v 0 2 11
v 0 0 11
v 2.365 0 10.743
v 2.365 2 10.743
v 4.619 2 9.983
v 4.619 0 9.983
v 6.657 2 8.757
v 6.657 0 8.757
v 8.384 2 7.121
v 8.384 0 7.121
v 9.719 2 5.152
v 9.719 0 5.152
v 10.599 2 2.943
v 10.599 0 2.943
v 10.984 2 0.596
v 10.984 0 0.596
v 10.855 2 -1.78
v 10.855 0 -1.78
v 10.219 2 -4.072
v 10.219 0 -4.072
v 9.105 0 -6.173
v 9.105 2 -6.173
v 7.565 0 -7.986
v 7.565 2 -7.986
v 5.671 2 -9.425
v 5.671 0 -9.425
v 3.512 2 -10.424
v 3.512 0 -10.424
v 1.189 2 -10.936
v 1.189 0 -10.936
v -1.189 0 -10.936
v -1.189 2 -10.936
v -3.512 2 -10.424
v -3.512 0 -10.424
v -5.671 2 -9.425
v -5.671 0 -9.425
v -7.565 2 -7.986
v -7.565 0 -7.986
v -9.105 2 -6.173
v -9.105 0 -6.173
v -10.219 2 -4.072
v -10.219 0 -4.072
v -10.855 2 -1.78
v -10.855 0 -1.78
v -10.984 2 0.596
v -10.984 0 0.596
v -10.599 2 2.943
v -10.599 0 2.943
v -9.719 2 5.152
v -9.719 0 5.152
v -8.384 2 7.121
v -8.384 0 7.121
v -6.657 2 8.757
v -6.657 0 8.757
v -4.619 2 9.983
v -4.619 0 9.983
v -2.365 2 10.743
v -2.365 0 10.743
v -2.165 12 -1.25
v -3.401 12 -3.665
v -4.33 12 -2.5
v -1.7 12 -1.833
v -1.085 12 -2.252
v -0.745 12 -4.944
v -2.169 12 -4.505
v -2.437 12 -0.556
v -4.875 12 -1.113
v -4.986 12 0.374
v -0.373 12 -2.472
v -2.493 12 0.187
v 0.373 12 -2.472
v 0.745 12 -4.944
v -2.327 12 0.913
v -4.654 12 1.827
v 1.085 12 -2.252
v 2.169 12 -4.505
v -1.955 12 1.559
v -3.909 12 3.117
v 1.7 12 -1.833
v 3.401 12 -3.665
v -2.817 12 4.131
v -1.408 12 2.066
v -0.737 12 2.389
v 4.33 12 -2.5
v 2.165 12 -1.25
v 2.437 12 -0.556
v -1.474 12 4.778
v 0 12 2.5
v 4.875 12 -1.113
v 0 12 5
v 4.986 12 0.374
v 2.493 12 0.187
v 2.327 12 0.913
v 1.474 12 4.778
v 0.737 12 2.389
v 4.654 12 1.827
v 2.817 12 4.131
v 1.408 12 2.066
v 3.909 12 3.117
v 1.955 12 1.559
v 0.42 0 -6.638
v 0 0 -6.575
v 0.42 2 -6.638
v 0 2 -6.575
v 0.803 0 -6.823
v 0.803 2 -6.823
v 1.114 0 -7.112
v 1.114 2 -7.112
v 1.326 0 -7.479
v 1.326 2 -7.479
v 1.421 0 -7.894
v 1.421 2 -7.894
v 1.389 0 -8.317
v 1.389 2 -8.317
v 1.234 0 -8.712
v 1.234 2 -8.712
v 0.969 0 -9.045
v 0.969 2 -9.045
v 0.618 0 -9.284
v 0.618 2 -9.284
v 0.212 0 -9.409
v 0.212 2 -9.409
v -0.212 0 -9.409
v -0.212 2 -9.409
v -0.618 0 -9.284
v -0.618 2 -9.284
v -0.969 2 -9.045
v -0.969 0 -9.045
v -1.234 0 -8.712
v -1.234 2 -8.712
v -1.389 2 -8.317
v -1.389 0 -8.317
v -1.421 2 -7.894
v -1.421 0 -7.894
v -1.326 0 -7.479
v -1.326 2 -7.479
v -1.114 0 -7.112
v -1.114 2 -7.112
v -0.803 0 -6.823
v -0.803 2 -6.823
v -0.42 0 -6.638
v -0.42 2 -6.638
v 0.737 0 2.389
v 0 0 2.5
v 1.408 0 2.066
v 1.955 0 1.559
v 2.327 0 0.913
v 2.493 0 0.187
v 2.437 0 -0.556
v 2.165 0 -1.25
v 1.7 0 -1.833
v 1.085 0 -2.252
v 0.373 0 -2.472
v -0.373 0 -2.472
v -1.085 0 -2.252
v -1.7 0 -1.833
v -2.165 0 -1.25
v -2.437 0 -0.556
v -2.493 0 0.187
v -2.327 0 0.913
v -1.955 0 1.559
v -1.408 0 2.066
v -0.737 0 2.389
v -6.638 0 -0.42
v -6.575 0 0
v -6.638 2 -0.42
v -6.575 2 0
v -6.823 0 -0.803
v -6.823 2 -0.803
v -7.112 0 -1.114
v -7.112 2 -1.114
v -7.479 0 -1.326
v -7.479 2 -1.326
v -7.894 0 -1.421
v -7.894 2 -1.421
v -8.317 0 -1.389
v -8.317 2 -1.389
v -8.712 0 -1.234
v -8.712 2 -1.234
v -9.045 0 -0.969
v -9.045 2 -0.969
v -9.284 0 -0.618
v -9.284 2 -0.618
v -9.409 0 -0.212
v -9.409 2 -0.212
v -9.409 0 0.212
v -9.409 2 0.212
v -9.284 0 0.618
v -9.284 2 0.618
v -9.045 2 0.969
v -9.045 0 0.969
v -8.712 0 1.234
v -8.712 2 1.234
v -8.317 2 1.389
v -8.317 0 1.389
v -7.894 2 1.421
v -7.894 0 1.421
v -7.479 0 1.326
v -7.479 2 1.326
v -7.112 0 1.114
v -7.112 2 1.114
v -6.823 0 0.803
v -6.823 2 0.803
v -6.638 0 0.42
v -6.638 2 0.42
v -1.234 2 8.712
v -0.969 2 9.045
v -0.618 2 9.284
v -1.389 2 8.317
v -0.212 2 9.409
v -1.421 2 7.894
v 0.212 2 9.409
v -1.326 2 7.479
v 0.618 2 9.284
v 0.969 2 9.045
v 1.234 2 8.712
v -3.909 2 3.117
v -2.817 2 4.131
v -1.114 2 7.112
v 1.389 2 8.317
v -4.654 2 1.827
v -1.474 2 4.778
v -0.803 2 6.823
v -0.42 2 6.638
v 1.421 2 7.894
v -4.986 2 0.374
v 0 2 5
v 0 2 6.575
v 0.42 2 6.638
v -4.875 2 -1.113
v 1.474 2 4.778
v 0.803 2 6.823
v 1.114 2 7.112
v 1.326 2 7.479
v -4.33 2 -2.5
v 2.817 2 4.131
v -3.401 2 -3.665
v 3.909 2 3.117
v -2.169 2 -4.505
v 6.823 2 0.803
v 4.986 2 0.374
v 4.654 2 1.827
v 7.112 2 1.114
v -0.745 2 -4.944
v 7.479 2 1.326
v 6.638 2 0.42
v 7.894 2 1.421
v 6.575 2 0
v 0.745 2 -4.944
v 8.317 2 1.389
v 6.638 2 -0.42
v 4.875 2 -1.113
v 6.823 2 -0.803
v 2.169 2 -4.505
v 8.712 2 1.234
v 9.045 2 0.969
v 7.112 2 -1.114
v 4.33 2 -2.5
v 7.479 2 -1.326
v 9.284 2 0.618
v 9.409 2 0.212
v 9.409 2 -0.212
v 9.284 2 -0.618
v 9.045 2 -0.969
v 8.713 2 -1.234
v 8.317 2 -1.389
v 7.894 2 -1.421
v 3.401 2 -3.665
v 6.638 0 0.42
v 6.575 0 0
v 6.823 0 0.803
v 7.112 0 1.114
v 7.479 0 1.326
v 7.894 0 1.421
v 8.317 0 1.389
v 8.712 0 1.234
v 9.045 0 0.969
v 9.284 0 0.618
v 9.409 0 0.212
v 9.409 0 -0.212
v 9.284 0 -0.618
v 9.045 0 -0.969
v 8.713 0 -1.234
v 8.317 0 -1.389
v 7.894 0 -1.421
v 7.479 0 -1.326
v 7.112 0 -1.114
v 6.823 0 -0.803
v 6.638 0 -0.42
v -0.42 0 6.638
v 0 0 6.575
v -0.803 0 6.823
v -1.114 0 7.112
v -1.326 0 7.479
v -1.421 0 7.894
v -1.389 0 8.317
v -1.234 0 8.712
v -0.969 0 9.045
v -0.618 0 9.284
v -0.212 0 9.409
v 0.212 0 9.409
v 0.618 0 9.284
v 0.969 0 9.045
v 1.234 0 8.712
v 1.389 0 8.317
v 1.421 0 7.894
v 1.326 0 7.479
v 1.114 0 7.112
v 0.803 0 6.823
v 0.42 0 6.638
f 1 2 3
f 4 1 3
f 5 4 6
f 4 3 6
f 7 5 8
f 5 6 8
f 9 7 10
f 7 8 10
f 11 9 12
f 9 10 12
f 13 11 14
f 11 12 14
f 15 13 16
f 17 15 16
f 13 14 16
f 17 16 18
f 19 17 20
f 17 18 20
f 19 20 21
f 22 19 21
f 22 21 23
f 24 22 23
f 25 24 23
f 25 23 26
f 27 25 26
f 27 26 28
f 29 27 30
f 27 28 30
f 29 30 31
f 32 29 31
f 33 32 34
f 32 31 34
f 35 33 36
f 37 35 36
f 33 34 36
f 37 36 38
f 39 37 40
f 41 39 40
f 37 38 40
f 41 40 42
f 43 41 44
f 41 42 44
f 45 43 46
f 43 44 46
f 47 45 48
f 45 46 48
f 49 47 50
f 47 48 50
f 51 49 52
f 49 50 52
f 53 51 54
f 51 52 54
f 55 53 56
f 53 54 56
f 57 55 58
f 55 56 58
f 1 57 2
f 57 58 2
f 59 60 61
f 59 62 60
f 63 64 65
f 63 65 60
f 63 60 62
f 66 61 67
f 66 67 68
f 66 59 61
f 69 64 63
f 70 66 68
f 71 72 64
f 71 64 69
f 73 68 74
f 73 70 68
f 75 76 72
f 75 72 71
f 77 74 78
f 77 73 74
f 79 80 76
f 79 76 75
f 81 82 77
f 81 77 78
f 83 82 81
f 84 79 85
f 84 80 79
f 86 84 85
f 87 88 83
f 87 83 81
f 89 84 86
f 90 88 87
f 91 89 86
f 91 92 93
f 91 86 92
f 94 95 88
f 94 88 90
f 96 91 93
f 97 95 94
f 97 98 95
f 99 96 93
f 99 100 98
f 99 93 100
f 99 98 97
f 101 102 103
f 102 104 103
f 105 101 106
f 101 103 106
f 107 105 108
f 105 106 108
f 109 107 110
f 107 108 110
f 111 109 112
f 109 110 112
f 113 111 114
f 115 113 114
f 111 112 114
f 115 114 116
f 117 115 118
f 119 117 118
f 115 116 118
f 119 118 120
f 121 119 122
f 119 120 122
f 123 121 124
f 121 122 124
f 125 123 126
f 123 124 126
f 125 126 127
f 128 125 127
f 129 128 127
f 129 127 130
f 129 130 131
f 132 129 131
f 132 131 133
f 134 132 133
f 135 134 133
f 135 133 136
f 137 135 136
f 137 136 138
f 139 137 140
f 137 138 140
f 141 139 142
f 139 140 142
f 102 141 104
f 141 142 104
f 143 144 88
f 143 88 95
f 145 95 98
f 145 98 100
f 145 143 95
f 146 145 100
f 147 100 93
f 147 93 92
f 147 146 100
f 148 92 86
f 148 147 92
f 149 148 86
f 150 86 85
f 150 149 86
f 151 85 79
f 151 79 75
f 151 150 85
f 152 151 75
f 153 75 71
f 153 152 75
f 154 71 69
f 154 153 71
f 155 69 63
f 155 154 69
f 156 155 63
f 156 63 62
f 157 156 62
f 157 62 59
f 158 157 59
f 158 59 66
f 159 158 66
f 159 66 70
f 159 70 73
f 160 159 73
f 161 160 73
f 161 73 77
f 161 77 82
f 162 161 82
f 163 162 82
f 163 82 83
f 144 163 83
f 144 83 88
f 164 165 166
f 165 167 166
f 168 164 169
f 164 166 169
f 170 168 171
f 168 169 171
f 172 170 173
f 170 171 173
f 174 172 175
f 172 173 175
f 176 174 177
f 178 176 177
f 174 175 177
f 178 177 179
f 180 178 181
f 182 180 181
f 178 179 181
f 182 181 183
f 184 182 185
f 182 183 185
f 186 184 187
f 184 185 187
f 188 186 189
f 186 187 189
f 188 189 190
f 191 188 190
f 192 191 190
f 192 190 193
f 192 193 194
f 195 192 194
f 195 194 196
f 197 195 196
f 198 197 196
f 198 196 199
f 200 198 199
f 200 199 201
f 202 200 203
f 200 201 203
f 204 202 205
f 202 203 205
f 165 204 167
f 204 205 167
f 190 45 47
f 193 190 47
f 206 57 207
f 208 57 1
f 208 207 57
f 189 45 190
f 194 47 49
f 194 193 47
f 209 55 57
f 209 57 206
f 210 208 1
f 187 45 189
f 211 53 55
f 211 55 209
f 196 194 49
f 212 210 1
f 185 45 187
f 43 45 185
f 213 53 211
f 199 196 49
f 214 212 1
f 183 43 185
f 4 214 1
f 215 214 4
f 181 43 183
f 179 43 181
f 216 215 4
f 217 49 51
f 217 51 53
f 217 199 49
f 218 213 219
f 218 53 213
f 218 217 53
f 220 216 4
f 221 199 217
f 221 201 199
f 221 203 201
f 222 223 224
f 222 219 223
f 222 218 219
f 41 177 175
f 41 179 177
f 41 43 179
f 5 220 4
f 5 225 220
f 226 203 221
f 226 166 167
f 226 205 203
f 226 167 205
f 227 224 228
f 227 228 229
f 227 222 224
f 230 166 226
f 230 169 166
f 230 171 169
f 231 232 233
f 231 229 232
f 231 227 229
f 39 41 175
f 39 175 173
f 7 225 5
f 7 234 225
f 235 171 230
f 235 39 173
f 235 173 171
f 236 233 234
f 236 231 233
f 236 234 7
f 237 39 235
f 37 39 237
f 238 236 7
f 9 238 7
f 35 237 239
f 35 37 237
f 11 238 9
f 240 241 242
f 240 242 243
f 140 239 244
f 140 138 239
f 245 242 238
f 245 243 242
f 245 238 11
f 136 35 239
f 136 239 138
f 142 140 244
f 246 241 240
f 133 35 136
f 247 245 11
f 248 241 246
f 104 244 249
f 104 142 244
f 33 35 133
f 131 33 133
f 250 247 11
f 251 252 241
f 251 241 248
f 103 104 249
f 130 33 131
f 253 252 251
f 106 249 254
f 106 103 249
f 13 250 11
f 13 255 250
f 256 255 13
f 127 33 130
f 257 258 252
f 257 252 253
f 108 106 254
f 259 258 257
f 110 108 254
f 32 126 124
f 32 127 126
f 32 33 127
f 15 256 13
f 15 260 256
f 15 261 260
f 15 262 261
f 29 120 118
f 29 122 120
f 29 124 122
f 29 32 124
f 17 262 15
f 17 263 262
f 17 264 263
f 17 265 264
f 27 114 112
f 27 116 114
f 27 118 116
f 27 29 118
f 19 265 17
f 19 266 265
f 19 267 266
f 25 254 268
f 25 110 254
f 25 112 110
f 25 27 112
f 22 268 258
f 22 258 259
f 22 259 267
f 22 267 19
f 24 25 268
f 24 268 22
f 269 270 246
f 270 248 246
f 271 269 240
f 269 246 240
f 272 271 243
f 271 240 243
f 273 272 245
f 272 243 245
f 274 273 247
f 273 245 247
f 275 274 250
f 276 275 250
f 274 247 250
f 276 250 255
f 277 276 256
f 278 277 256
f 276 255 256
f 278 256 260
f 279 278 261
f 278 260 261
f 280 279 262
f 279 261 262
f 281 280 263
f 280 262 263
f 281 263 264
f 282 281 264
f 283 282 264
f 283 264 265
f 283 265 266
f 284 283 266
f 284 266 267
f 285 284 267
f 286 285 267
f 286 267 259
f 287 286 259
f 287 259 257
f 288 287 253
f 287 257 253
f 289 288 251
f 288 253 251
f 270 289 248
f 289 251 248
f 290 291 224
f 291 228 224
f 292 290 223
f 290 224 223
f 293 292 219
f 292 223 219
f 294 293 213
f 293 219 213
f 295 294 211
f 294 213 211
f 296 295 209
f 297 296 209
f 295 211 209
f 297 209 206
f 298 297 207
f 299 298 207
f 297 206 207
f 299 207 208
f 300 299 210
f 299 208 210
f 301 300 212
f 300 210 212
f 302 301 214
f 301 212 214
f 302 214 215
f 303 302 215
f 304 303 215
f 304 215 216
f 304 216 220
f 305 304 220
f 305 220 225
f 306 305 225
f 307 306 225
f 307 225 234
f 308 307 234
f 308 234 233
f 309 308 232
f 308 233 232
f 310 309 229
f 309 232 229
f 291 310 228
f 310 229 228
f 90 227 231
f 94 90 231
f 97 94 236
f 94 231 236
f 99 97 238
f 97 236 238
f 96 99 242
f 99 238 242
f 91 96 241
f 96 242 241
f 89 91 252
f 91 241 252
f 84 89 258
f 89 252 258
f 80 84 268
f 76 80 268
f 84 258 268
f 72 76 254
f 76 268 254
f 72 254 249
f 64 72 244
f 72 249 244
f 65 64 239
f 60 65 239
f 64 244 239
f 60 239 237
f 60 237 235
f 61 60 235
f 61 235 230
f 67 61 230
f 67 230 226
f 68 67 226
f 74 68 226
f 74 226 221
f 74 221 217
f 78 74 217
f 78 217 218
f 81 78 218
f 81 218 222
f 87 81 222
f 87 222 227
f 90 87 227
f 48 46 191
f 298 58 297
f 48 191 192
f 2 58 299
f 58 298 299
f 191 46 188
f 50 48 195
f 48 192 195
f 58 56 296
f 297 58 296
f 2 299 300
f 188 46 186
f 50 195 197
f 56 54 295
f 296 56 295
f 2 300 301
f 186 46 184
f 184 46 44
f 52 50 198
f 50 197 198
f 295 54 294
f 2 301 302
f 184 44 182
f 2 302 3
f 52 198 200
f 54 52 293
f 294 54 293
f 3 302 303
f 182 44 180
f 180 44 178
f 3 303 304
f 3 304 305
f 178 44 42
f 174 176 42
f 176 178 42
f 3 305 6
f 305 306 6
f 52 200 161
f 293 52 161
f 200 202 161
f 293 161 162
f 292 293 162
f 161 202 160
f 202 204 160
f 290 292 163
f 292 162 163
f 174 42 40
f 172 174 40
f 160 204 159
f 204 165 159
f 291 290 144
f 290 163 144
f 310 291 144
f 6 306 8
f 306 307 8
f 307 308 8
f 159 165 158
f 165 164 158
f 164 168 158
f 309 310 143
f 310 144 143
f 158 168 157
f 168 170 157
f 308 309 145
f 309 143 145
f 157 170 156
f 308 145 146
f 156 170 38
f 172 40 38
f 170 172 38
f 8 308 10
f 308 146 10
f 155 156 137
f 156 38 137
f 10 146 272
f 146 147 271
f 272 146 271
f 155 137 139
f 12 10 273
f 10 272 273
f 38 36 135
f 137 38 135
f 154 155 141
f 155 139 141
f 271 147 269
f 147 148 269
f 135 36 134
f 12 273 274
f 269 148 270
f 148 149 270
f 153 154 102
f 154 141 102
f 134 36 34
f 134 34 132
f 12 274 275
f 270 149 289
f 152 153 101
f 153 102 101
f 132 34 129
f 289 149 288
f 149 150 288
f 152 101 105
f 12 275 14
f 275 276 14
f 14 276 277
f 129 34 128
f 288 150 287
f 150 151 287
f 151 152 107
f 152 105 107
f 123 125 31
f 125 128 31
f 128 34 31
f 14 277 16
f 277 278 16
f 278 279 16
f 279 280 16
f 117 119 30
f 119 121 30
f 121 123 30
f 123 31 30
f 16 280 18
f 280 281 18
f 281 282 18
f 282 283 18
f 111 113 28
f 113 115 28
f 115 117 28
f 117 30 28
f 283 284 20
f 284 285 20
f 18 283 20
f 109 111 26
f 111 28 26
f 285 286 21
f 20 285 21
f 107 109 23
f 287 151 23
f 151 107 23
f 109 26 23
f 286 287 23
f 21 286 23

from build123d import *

# Parameters (mm, degrees)
SKETCH1_R           = 11
SKETCH1_R_2         = 2.5
BOSS_EXTRUDE1_DEPTH = 2
SKETCH1_3_R         = 5
SKETCH1_3_R_2       = 2.5
BOSS_EXTRUDE2_DEPTH = 12
SKETCH2_R           = 1.425
CUT_EXTRUDE1_DEPTH  = 19.493242009
CIRPATTERN1_COUNT   = 4


with BuildPart() as part:
    # Sketch1 → Boss-Extrude1 (new body)
    with BuildSketch(Plane(origin=(0, 0, 0), x_dir=(1, 0, 0), z_dir=(0, 1, 0))):
        Circle(SKETCH1_R)
        Circle(SKETCH1_R_2, mode=Mode.SUBTRACT)
    extrude(amount=BOSS_EXTRUDE1_DEPTH)

    # Sketch1<3> → Boss-Extrude2 (add)
    with BuildSketch(Plane(origin=(0, 0, 0), x_dir=(1, 0, 0), z_dir=(0, 1, 0))):
        Circle(SKETCH1_3_R)
        Circle(SKETCH1_3_R_2, mode=Mode.SUBTRACT)
    extrude(amount=BOSS_EXTRUDE2_DEPTH)

    # Sketch2 → Cut-Extrude1 (cut, symmetric)
    with BuildSketch(Plane(origin=(0, 2, 0), x_dir=(1, 0, 0), z_dir=(0, 1, 0))):
        with Locations((0, 8)):
            Circle(SKETCH2_R)
    cut_extrude1 = extrude(amount=CUT_EXTRUDE1_DEPTH, both=True, mode=Mode.SUBTRACT)

    # CirPattern1: Cut-Extrude1 ×4 about axis
    cirpattern1_axis = Axis((0, 12, 0), (0, -1, 0))
    for i in range(1, CIRPATTERN1_COUNT):
        add(cut_extrude1.rotate(cirpattern1_axis, i * 360 / CIRPATTERN1_COUNT), mode=Mode.SUBTRACT)


solid = part.part
